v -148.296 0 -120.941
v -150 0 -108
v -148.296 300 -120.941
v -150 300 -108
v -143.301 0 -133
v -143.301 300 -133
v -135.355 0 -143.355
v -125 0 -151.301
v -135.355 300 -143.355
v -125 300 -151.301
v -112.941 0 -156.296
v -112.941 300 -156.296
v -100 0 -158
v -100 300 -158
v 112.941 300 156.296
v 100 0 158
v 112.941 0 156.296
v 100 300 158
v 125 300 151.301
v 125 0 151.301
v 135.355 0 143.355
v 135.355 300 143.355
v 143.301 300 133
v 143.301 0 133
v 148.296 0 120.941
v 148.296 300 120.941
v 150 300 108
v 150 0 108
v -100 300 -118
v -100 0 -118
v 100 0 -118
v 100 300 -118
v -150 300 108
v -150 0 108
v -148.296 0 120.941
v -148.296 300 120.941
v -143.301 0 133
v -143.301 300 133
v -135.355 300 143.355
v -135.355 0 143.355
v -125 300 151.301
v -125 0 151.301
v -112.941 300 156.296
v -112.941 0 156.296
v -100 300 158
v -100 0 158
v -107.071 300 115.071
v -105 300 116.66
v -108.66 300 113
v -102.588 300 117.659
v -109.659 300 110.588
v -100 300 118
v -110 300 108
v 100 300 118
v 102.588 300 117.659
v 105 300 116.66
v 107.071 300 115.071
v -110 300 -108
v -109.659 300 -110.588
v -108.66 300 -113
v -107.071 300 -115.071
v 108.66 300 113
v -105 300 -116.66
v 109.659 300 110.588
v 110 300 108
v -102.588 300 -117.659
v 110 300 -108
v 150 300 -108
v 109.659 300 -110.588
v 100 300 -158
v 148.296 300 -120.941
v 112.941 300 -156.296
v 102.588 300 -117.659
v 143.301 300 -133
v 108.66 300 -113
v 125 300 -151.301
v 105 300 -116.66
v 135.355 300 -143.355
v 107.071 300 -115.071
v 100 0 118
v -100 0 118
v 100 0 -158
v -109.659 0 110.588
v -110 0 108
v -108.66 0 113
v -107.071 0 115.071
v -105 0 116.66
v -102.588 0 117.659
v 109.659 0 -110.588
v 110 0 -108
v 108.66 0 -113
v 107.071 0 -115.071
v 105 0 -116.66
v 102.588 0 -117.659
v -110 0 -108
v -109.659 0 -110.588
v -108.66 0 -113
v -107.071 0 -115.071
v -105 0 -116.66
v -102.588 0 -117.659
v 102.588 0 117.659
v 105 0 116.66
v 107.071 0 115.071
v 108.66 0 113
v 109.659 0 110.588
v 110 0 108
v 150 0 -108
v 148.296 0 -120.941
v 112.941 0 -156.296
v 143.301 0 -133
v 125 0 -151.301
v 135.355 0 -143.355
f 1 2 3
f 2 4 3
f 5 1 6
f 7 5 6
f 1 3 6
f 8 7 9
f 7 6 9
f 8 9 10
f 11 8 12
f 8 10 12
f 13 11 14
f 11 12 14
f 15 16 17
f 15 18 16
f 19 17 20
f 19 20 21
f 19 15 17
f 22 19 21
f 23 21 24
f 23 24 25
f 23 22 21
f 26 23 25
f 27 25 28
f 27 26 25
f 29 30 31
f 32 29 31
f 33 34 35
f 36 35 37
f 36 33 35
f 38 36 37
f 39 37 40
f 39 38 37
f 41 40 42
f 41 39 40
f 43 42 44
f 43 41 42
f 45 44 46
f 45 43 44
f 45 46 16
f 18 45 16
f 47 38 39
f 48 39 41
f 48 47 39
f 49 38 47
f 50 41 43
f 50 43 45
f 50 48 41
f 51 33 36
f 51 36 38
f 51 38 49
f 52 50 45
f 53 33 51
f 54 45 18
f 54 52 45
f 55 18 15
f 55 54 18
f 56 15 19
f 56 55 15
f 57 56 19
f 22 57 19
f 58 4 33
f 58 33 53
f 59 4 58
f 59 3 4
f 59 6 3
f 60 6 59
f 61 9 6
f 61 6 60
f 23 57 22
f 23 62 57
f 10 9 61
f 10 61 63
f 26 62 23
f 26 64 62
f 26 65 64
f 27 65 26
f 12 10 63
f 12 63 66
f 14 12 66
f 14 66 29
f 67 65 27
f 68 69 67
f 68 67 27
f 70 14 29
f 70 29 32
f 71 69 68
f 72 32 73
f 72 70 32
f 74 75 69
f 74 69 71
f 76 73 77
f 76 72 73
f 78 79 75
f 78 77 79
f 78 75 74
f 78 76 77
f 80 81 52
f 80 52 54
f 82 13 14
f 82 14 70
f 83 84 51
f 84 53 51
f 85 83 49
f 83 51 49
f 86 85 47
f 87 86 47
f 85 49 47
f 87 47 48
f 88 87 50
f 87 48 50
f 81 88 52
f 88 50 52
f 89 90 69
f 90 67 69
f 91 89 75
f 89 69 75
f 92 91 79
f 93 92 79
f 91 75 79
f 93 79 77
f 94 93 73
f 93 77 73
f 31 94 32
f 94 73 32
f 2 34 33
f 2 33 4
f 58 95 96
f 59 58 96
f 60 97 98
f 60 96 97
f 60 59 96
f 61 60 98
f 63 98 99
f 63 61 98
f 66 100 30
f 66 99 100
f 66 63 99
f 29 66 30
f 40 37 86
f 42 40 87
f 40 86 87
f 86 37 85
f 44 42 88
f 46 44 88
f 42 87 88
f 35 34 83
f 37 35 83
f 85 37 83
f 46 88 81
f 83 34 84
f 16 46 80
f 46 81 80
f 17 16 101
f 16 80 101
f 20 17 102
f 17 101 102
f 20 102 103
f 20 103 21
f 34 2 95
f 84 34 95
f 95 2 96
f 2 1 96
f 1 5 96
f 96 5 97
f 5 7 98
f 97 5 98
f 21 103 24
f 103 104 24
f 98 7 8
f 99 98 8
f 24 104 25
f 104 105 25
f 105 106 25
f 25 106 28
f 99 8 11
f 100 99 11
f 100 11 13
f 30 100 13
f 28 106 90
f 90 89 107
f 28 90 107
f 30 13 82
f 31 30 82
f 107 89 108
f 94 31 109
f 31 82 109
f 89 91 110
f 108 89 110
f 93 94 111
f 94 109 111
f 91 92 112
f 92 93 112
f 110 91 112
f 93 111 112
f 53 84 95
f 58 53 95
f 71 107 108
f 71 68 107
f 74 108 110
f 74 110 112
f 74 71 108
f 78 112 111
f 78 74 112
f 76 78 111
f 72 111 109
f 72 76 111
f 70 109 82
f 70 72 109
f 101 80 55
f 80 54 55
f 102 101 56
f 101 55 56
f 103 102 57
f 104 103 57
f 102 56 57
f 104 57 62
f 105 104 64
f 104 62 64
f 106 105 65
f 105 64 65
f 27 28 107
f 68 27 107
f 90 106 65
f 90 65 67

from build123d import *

# Parameters (mm, degrees)
SKETCH1_W           = 300
SKETCH1_H           = 316
BOSS_EXTRUDE1_DEPTH = 300
FILLET1_R           = 50
SHELL1_T            = -40


with BuildPart() as part:
    # Sketch1 → Boss-Extrude1 (new body)
    with BuildSketch(Plane(origin=(0, 0, 0), x_dir=(1, 0, 0), z_dir=(0, 1, 0))):
        Rectangle(SKETCH1_W, SKETCH1_H)
    extrude(amount=BOSS_EXTRUDE1_DEPTH)

    # Fillet1
    fillet1_edges = [part.edges().sort_by_distance(p)[0] for p in [
        (-150, 150, -158),
        (150, 150, -158),
        (150, 150, 158),
        (-150, 150, 158),
    ]]
    fillet(fillet1_edges, radius=FILLET1_R)

    # Shell1
    shell1_openings = [part.faces().sort_by_distance(p)[0] for p in [
        (0, 300, 0),
        (0, 0, 0),
    ]]
    offset(amount=SHELL1_T, openings=shell1_openings, kind=Kind.INTERSECTION)


solid = part.part
